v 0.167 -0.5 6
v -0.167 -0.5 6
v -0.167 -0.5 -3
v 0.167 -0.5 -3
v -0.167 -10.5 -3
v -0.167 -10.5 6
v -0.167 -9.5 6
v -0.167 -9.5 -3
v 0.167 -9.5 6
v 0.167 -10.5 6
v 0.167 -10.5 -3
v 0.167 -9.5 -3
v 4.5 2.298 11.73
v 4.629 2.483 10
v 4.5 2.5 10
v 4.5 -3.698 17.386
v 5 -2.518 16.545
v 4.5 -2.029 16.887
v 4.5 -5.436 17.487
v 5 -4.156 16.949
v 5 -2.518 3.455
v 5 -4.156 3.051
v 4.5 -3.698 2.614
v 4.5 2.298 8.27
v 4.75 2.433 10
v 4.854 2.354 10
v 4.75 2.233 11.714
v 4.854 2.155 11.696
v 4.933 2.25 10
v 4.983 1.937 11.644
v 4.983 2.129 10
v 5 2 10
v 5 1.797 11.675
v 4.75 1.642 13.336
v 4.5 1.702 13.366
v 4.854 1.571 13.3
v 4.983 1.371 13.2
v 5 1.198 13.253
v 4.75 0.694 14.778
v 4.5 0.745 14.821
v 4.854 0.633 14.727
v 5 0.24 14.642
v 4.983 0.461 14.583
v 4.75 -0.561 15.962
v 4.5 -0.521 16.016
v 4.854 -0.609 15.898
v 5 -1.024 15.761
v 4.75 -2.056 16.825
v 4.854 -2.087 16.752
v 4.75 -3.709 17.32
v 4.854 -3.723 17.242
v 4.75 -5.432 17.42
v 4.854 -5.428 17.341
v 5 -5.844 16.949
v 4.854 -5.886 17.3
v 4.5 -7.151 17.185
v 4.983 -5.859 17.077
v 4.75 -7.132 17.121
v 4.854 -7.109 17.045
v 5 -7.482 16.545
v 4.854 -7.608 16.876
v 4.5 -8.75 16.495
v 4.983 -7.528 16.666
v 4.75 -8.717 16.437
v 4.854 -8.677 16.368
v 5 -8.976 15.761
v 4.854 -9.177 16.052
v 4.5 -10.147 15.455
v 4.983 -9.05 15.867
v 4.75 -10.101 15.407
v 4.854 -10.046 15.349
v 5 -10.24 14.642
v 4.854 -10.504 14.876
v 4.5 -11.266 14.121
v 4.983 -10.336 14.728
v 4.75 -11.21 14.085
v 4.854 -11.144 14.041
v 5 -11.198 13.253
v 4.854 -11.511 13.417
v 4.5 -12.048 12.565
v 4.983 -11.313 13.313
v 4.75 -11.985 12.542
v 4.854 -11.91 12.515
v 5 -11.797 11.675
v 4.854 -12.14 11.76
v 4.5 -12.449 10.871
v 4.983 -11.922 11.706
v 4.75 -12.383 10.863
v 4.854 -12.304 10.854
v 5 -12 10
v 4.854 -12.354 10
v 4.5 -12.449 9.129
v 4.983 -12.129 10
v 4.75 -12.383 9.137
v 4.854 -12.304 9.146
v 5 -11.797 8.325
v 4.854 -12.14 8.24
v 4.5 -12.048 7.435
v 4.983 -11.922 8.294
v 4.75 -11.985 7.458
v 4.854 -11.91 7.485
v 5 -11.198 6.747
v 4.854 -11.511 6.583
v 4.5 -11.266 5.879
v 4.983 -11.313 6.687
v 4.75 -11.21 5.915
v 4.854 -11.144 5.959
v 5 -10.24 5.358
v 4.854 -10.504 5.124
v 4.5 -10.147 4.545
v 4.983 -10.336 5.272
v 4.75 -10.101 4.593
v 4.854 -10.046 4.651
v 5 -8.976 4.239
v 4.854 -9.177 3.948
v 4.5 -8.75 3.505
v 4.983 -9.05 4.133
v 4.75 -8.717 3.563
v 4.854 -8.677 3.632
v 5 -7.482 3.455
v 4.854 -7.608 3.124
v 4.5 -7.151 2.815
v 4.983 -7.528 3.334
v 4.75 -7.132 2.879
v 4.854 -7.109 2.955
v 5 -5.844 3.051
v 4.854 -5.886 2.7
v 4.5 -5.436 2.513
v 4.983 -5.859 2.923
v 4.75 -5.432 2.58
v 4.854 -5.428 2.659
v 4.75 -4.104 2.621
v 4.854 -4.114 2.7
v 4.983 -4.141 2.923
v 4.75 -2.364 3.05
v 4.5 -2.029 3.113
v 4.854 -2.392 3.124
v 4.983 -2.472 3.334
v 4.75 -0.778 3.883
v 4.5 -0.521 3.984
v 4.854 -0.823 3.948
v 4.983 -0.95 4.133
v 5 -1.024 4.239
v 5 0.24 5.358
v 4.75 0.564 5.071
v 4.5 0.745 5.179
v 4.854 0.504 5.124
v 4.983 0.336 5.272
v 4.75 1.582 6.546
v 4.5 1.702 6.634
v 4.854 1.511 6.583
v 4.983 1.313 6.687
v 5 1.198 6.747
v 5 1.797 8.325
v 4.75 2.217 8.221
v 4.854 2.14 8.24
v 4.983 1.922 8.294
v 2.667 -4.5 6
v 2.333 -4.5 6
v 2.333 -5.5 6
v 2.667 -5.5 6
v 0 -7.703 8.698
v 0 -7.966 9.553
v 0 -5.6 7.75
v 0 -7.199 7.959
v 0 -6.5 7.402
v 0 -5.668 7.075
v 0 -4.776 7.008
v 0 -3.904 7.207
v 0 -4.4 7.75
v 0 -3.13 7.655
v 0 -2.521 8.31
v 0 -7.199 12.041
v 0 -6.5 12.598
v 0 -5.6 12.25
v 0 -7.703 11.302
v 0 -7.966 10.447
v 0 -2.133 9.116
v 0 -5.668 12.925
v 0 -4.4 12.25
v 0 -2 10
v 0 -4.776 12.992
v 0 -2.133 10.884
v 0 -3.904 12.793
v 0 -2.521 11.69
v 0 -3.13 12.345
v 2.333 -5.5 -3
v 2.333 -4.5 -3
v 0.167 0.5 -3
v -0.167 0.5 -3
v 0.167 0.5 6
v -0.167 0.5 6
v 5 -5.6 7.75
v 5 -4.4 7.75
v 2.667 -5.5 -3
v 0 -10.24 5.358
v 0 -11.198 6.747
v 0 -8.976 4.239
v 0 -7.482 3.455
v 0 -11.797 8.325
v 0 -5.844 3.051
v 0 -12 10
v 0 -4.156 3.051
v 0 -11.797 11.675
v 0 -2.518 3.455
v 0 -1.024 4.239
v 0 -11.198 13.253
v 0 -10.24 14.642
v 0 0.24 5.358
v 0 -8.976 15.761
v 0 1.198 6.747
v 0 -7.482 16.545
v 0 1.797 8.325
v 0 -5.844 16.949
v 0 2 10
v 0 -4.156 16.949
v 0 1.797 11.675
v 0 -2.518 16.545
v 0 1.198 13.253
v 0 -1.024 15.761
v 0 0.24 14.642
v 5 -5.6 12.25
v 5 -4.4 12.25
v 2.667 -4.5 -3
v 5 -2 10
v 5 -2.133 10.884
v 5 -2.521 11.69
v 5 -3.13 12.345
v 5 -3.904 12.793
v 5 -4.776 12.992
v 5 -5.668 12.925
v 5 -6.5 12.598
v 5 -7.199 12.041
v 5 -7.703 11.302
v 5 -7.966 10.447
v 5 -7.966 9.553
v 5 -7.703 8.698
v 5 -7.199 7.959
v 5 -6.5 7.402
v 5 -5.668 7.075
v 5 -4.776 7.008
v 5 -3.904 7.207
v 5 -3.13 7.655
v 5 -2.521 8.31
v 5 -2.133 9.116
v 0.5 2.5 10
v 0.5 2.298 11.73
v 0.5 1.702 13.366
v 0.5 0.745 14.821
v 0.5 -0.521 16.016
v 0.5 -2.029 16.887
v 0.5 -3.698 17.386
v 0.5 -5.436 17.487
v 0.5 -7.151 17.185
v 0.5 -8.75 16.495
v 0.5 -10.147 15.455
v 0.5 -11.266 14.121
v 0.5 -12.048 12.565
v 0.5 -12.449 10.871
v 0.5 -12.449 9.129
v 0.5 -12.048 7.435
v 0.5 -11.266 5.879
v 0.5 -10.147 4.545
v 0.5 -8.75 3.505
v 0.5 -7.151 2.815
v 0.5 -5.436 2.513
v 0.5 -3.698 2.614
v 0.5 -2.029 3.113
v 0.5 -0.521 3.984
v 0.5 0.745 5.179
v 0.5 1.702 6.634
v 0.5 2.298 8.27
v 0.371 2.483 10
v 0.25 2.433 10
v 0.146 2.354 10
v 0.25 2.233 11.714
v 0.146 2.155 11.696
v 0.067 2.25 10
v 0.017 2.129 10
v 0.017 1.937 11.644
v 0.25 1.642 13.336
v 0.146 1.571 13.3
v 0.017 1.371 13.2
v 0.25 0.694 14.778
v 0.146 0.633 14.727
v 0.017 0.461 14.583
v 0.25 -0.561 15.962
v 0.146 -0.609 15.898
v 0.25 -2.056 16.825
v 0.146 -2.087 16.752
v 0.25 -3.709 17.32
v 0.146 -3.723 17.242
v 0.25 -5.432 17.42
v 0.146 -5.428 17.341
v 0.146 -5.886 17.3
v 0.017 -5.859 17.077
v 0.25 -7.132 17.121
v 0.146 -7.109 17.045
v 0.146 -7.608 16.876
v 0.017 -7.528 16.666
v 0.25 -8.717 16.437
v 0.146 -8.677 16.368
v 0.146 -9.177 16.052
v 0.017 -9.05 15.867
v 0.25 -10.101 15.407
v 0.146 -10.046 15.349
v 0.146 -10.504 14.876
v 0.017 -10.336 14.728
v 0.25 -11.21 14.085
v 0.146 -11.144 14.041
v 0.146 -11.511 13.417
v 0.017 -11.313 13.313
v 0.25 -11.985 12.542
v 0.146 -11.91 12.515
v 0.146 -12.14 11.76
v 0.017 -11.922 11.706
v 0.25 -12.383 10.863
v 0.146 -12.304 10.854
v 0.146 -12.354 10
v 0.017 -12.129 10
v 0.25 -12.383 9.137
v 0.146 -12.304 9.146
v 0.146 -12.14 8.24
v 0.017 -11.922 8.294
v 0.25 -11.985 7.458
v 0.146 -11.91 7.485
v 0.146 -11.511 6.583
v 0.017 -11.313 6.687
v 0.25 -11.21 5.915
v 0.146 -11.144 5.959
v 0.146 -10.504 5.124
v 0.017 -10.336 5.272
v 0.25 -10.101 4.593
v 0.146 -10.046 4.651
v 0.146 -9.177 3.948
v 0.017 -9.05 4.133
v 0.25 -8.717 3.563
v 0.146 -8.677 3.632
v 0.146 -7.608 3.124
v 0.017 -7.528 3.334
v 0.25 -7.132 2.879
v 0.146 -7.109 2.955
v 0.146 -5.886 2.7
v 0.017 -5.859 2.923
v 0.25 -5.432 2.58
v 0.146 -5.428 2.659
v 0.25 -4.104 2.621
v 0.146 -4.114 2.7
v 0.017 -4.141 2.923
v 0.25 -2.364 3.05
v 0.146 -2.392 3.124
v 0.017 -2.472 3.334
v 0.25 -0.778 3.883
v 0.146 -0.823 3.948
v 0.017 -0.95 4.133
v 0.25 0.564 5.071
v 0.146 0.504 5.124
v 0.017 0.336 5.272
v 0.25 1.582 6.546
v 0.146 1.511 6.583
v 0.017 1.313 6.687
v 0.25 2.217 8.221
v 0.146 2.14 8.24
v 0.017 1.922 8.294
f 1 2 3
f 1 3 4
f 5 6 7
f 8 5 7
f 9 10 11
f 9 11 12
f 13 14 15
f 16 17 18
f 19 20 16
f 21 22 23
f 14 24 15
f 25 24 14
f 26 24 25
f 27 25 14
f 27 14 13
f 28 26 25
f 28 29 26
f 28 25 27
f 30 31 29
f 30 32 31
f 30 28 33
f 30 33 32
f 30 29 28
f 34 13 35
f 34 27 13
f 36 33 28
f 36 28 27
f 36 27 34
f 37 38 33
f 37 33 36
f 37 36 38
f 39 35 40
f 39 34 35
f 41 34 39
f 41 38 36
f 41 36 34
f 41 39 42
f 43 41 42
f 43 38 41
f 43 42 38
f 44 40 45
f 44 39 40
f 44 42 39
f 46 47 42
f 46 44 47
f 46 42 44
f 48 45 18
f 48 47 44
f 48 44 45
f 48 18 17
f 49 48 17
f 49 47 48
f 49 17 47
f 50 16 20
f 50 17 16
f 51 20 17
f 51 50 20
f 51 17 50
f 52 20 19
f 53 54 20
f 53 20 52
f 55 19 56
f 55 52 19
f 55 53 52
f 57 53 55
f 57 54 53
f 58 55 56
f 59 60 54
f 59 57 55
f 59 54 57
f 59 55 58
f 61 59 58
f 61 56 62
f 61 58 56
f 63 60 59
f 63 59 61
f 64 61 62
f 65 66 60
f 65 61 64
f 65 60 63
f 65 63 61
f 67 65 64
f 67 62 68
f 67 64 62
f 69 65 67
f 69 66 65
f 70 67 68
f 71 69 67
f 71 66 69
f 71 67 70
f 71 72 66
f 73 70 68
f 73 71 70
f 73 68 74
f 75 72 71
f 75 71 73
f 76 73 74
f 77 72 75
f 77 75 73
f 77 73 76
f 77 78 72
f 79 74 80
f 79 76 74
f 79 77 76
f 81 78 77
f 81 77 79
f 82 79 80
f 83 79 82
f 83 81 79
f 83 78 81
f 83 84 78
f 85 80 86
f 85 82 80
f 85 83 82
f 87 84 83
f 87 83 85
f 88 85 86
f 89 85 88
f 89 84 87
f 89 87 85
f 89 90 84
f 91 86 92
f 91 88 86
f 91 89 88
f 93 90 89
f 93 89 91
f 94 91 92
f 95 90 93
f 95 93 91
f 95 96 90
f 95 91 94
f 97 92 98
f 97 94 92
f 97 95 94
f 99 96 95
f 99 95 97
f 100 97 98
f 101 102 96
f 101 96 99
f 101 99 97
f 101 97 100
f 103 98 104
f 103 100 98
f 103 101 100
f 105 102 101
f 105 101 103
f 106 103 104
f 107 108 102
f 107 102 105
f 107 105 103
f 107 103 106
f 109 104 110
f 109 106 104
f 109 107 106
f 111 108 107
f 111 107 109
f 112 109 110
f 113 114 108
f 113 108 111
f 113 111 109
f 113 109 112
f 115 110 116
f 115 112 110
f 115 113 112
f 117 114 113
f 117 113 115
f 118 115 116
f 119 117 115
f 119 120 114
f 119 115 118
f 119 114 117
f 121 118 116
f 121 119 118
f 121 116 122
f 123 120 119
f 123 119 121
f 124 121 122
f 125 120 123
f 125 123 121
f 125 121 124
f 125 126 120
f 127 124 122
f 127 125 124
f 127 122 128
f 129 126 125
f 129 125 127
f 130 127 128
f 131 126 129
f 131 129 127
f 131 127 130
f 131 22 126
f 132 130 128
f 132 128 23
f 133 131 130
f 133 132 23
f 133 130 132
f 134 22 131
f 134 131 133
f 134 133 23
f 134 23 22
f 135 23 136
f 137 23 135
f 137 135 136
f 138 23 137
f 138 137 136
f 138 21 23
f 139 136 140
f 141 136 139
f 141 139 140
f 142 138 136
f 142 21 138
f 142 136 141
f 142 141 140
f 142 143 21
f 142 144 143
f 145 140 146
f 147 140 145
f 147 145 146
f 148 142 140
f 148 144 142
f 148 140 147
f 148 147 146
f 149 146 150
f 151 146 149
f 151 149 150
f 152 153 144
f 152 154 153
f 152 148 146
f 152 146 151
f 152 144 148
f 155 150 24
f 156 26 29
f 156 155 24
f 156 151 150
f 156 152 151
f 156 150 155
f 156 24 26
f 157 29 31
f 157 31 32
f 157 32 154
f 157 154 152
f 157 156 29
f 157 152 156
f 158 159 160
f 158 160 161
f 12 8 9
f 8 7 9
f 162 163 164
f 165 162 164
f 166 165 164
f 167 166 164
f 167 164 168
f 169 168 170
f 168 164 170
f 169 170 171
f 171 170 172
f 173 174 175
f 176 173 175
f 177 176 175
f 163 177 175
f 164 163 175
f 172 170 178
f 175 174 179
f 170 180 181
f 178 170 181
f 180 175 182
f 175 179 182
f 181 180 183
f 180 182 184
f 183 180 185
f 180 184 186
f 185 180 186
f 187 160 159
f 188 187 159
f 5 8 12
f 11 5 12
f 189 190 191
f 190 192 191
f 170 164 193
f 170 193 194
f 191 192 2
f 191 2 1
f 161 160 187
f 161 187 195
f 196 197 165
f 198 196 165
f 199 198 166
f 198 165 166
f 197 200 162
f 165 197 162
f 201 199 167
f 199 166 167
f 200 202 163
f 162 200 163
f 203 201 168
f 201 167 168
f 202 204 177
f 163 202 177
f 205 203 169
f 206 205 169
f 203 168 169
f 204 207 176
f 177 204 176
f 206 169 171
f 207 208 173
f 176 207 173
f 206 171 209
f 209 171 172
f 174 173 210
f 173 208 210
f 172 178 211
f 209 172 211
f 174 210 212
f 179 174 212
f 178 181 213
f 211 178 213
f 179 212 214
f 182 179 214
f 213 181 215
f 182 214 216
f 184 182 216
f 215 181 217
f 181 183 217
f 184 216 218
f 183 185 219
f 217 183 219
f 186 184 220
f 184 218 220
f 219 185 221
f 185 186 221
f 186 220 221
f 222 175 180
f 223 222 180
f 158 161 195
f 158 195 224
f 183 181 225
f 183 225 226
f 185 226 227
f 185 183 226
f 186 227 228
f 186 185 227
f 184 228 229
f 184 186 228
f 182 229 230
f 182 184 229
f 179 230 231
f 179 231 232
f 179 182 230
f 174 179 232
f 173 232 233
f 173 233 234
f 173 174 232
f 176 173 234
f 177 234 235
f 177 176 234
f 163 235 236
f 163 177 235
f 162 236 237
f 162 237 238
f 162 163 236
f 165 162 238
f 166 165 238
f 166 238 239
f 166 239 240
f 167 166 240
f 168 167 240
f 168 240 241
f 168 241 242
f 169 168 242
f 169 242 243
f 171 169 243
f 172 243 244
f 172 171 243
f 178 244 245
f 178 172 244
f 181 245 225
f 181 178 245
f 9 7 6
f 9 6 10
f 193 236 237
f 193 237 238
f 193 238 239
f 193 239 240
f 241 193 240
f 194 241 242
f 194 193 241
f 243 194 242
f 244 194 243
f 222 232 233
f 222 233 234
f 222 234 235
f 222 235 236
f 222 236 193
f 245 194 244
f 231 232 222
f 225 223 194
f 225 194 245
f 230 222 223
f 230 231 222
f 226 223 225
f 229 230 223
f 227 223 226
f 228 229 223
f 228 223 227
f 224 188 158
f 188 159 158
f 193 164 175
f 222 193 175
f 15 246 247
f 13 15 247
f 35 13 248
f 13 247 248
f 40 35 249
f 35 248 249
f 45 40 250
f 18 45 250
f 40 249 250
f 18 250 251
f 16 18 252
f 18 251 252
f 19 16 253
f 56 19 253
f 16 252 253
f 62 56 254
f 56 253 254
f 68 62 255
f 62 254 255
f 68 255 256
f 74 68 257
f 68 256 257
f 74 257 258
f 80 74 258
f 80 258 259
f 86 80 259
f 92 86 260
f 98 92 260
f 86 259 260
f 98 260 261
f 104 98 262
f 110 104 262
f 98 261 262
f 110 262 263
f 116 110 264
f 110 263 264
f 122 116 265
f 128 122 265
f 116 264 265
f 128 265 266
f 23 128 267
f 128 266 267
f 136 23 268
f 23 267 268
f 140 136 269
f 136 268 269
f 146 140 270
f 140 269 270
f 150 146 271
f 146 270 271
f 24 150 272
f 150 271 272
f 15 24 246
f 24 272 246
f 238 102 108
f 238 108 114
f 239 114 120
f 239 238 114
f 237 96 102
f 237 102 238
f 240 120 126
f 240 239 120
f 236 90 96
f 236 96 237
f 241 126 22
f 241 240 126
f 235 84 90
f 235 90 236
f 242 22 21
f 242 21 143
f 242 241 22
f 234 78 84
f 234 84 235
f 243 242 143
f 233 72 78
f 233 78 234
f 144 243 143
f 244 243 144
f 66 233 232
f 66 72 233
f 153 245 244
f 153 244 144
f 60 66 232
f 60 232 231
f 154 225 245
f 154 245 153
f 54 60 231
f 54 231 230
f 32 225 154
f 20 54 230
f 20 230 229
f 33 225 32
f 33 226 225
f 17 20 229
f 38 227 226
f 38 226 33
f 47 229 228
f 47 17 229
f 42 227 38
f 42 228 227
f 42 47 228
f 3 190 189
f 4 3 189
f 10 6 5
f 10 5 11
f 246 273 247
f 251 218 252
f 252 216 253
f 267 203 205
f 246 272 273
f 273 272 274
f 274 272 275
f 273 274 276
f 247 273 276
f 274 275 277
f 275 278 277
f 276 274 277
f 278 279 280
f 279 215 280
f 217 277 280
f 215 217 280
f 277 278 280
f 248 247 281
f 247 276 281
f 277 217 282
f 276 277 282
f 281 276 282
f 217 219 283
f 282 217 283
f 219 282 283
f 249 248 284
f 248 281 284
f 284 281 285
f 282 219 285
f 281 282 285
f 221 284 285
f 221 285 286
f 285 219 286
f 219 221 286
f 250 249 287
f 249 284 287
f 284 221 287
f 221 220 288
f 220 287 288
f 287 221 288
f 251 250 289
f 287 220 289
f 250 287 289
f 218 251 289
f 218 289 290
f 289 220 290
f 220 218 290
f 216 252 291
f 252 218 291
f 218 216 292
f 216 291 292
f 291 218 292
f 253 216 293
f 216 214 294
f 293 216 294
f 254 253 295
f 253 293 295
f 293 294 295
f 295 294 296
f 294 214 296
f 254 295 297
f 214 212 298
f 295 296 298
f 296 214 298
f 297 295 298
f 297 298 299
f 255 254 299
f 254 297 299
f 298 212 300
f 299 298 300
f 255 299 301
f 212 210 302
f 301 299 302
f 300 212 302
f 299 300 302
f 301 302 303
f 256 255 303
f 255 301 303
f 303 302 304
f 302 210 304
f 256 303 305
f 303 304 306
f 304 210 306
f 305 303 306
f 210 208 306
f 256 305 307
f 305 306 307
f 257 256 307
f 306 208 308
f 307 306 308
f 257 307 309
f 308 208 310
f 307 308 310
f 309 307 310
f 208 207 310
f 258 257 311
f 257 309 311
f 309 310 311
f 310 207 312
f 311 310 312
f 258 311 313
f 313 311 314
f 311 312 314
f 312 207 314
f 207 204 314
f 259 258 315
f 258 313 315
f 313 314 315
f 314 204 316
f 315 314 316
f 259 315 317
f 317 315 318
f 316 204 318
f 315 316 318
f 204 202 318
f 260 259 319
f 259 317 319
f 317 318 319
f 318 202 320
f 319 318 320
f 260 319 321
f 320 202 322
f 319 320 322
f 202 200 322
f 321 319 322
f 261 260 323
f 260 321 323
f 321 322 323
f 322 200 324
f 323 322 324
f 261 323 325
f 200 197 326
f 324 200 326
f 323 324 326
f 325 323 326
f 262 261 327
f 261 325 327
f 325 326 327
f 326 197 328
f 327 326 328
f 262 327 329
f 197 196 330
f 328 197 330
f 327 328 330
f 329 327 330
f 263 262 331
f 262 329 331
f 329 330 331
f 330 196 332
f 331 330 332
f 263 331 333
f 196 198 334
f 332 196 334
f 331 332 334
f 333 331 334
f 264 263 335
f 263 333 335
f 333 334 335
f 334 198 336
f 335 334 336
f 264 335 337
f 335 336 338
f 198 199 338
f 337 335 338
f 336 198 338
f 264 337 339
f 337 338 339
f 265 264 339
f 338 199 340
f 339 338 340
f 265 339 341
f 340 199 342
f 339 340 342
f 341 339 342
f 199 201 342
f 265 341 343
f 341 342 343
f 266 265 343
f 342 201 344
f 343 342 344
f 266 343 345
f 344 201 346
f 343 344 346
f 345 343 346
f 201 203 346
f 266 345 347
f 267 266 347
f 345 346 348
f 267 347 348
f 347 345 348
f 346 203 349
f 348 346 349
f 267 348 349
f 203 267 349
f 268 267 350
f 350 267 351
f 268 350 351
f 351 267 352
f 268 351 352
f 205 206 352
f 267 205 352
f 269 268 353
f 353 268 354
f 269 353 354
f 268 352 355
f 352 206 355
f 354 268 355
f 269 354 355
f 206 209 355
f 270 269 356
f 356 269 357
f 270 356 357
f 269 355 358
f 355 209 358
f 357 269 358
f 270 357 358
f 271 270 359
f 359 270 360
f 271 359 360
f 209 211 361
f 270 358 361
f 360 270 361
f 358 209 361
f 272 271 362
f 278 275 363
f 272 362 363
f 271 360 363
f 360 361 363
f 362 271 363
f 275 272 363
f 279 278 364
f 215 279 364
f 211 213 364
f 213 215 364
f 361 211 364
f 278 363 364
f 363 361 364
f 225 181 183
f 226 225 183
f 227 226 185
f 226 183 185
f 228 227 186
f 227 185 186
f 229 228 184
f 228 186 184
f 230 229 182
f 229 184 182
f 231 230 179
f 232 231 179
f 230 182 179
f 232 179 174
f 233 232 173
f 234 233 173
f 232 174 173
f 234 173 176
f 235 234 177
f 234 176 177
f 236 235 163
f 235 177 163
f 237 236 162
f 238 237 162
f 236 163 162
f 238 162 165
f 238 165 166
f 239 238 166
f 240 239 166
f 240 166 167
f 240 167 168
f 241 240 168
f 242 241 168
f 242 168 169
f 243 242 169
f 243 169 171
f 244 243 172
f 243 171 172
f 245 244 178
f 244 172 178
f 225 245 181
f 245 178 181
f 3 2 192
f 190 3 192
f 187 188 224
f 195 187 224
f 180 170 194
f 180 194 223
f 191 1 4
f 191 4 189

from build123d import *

# Parameters (mm, degrees)
SKETCH001_R       = 3
SKETCH001_W       = 1.2
SKETCH001_H       = 4.5
PAD001_DEPTH      = 5
SKETCH_R          = 7.5
SKETCH_R_2        = 3
PAD_DEPTH         = 5
FILLET_R          = 0.5
SKETCH003_W       = 0.333334
SKETCH003_H       = 1
PAD002_DEPTH      = 6
PAD002_DEPTH_BACK = 3


with BuildPart() as pad001:
    # Sketch001 → Pad001 (new body)
    with BuildSketch(Plane.YZ):
        with Locations((-5, 10)):
            Circle(SKETCH001_R)
        with Locations((-5, 10)):
            Rectangle(SKETCH001_W, SKETCH001_H, mode=Mode.SUBTRACT)
    extrude(amount=PAD001_DEPTH)


with BuildPart() as fillet_body:
    # Sketch → Pad (new body)
    with BuildSketch(Plane.YZ):
        with Locations((-5, 10)):
            Circle(SKETCH_R)
        with Locations((-5, 10)):
            Circle(SKETCH_R_2, mode=Mode.SUBTRACT)
    extrude(amount=PAD_DEPTH)

    # Fillet
    fillet_edges = [fillet_body.edges().sort_by_distance(p)[0] for p in [
        (0, -12.5, 10),
        (5, -12.5, 10),
    ]]
    fillet(fillet_edges, radius=FILLET_R)


with BuildPart() as pad002:
    # Sketch003 → Pad002 (new body, two sides)
    with BuildSketch(Plane.XY) as pad002_sk:
        Rectangle(SKETCH003_W, SKETCH003_H)
        with Locations((2.5, -5)):
            Rectangle(SKETCH003_W, SKETCH003_H)
        with Locations((0, -10)):
            Rectangle(SKETCH003_W, SKETCH003_H)
    extrude(amount=PAD002_DEPTH)
    extrude(pad002_sk.sketch, amount=-PAD002_DEPTH_BACK)


solid = Compound([pad001.part, fillet_body.part, pad002.part])
